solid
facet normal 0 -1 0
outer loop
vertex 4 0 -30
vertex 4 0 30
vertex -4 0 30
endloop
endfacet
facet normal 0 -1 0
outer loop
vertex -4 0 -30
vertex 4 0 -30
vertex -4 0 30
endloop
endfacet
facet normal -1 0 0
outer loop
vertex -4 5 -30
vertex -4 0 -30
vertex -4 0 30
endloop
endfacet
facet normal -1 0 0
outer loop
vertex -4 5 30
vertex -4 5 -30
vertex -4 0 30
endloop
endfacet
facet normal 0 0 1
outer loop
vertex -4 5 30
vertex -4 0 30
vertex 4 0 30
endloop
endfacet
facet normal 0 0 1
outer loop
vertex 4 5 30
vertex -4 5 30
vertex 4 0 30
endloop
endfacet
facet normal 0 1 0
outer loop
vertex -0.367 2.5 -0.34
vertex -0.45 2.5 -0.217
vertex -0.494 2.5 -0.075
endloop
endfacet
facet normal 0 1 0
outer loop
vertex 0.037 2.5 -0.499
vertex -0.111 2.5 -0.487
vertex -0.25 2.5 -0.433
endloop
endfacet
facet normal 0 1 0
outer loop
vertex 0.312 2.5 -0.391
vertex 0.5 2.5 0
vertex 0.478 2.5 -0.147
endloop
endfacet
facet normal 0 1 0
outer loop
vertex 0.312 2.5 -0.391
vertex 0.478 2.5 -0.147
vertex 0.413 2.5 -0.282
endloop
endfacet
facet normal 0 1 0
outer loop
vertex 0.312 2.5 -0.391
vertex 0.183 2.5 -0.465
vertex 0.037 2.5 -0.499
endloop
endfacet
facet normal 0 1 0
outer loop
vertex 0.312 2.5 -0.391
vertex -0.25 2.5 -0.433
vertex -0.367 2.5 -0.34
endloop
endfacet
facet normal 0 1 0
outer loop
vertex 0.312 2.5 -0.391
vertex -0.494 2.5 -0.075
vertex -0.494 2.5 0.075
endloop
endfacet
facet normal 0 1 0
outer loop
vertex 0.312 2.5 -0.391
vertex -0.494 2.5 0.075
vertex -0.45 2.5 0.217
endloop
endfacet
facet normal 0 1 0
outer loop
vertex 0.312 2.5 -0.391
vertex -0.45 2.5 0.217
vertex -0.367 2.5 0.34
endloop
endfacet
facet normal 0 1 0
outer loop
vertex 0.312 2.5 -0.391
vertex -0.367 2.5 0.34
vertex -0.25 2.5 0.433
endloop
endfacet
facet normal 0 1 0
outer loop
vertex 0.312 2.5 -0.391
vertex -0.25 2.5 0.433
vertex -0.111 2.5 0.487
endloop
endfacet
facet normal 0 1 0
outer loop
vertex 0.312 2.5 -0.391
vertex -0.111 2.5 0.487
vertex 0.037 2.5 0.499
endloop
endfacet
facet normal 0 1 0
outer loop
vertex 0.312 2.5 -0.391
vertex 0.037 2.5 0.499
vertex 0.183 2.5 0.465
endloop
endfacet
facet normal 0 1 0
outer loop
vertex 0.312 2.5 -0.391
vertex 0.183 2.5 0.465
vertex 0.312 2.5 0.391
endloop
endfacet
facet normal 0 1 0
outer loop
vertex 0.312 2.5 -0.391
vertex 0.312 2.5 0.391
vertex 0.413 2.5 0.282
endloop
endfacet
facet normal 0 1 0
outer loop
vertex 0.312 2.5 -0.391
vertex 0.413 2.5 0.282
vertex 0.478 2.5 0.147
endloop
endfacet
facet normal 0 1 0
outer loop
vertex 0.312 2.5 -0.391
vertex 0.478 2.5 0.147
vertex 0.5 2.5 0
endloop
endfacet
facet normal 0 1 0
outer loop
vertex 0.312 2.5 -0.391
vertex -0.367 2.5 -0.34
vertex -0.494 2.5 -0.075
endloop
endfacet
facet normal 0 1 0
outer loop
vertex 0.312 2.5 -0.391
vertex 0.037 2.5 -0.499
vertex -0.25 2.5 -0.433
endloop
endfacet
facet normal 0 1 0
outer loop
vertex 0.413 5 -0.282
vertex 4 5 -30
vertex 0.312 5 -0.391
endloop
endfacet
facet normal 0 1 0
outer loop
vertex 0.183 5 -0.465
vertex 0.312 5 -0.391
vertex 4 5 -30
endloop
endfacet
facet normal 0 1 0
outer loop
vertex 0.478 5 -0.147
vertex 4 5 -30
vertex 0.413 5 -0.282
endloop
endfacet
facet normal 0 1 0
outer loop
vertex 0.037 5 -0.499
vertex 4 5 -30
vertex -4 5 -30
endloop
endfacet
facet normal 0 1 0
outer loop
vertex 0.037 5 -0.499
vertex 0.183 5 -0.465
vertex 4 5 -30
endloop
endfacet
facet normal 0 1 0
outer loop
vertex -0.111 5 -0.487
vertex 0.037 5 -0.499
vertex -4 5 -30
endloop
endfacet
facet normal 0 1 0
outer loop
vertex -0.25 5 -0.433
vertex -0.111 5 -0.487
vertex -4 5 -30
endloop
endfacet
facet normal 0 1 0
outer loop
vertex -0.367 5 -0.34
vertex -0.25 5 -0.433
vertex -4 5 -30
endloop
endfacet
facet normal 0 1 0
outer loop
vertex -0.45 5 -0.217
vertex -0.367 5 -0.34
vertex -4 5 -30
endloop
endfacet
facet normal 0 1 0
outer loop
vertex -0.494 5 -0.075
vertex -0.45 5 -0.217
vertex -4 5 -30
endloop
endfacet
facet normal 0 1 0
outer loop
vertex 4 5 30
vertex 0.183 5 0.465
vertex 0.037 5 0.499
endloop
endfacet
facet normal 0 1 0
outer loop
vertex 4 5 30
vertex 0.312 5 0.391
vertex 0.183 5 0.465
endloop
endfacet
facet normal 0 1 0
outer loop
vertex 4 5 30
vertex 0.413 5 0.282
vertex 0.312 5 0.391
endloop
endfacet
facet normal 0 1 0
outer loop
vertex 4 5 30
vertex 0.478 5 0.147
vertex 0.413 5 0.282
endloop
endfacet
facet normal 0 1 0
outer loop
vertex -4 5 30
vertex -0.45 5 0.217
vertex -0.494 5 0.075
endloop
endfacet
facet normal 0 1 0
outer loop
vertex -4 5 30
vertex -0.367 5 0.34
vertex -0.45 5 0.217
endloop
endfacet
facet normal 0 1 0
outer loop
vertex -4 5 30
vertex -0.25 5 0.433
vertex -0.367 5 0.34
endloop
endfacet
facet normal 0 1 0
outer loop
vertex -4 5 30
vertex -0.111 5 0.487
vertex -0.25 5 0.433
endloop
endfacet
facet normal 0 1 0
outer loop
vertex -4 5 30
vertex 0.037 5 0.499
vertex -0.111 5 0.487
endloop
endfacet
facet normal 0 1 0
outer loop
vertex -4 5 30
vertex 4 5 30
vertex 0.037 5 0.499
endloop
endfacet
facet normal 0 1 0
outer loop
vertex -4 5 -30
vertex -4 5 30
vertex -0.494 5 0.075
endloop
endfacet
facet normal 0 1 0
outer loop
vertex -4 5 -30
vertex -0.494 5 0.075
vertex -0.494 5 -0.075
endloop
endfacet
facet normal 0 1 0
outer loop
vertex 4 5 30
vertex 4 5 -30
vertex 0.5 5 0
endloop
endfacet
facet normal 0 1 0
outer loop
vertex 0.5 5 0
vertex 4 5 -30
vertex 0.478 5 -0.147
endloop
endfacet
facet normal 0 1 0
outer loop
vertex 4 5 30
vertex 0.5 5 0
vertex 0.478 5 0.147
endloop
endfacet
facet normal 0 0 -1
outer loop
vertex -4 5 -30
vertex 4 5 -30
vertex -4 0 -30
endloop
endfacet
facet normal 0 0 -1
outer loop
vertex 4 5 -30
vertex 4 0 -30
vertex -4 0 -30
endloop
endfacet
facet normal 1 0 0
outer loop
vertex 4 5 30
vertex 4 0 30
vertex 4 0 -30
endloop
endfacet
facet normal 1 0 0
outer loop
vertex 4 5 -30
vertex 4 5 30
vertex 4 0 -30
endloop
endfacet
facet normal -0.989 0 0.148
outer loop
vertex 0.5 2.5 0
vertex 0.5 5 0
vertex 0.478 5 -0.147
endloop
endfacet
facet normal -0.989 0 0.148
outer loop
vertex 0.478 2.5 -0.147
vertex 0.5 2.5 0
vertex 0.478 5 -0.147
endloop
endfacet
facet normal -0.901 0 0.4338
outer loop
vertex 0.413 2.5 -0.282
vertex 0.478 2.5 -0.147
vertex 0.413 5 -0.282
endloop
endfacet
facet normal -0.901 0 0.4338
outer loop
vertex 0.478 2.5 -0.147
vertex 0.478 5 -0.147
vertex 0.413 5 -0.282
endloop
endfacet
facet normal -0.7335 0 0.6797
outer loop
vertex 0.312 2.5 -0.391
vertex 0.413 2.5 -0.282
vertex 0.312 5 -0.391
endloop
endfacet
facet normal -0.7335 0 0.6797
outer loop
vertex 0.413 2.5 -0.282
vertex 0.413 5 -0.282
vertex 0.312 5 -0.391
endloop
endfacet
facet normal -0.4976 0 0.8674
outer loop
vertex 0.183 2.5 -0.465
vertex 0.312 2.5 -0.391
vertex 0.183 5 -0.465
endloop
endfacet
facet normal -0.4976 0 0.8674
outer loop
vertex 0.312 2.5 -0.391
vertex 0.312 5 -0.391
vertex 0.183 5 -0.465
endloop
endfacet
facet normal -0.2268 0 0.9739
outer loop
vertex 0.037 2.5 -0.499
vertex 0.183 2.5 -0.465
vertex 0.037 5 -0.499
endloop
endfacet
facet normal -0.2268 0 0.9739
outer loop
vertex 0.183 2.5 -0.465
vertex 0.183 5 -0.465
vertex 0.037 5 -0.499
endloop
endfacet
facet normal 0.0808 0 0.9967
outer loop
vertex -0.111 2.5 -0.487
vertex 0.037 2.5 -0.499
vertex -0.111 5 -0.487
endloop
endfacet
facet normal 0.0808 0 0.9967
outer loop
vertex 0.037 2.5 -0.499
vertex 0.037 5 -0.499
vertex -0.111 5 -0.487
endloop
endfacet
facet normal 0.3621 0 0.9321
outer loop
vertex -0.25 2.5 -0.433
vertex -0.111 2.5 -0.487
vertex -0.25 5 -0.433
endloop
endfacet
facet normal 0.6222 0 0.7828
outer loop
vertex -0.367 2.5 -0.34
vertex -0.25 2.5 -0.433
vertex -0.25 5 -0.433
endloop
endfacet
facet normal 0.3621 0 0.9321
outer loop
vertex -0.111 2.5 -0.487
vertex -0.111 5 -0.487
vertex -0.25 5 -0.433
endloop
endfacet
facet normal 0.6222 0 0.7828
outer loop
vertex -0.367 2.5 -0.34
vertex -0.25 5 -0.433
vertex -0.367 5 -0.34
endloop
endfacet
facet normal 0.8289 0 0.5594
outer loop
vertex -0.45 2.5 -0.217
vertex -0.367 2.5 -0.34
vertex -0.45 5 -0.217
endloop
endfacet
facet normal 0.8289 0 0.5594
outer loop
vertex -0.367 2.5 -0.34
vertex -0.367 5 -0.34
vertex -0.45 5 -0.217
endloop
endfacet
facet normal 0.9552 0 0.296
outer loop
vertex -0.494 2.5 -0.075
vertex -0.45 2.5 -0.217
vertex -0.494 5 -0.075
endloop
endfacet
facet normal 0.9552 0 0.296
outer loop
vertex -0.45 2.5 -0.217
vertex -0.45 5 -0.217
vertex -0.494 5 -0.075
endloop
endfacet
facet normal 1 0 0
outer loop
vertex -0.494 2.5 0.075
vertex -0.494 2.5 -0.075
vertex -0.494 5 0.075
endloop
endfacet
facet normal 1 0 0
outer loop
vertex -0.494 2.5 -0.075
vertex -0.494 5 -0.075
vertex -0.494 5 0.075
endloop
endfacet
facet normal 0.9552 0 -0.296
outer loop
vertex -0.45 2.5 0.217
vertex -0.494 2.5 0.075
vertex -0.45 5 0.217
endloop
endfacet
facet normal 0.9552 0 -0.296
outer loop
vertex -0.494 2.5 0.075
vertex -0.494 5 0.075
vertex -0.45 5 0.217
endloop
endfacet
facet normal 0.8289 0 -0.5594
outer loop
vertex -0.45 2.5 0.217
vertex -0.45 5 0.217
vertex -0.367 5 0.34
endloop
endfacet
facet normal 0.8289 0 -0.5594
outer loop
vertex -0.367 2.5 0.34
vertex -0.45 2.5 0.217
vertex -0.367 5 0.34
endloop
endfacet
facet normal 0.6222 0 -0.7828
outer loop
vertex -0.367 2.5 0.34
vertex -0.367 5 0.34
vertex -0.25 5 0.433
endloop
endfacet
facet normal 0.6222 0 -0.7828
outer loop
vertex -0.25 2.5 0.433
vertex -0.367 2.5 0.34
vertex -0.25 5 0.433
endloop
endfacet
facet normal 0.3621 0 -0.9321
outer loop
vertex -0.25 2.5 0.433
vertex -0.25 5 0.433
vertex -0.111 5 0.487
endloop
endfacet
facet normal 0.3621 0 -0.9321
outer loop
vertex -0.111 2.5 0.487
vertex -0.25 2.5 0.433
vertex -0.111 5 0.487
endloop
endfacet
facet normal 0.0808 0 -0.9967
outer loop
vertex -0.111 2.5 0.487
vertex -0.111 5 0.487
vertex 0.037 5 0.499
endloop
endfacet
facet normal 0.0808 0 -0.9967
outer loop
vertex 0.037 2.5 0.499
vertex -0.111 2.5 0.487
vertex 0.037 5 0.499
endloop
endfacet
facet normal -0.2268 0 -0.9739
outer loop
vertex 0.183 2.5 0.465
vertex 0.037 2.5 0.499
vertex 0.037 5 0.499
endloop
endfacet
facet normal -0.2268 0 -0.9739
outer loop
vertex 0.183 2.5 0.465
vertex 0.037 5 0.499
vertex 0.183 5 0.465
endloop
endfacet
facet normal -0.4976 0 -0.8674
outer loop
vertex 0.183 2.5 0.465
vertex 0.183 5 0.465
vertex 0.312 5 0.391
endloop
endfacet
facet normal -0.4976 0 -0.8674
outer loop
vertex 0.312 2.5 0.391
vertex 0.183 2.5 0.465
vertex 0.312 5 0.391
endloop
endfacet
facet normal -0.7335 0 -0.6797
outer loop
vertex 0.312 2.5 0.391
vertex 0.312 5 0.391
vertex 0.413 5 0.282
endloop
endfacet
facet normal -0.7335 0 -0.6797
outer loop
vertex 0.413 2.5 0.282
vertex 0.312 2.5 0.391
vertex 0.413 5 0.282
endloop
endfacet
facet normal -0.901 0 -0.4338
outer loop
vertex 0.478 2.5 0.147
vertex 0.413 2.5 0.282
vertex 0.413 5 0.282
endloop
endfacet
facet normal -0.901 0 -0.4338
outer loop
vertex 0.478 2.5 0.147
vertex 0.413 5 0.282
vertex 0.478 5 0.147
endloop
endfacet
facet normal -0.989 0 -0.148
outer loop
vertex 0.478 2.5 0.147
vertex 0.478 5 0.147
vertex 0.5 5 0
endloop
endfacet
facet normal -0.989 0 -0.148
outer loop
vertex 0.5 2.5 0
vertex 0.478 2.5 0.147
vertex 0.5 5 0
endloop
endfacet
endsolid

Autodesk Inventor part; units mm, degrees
ref_plane "YZ Plane" through (0, 0, 0) normal (1, 0, 0) x (0, 1, 0)
ref_plane "XZ Plane" through (0, 0, 0) normal (0, 1, 0) x (-1, 0, 0)
ref_plane "XY Plane" through (0, 0, 0) normal (0, 0, 1) x (1, 0, 0)
sketch "Szkic1" plane through (0, 0, 0) normal (0, 1, 0) x (-1, 0, 0)
  line L0 (4, 30) -> (-4, 30)
  line L1 (-4, 30) -> (-4, -30)
  line L2 (-4, -30) -> (4, -30)
  line L3 (4, -30) -> (4, 30)
  point P0 (0, 0)
  point P1 (4, 0)
  point P2 (0, -30)
  dimension "d0" = 8
  dimension "d1" = 60
extrude "Wyciągnięcie proste1" add sketch "Szkic1" along normal blind 5
sketch "Szkic2" plane through (0, 5, 0) normal (0, 1, 0) x (1, 0, 0)
  circle A0 centre (0, 0) radius 0.5
  dimension "d4" = 1
extrude "Wyciągnięcie proste2" cut sketch "Szkic2" against normal blind 2.5
properties part number "Smiglo"
